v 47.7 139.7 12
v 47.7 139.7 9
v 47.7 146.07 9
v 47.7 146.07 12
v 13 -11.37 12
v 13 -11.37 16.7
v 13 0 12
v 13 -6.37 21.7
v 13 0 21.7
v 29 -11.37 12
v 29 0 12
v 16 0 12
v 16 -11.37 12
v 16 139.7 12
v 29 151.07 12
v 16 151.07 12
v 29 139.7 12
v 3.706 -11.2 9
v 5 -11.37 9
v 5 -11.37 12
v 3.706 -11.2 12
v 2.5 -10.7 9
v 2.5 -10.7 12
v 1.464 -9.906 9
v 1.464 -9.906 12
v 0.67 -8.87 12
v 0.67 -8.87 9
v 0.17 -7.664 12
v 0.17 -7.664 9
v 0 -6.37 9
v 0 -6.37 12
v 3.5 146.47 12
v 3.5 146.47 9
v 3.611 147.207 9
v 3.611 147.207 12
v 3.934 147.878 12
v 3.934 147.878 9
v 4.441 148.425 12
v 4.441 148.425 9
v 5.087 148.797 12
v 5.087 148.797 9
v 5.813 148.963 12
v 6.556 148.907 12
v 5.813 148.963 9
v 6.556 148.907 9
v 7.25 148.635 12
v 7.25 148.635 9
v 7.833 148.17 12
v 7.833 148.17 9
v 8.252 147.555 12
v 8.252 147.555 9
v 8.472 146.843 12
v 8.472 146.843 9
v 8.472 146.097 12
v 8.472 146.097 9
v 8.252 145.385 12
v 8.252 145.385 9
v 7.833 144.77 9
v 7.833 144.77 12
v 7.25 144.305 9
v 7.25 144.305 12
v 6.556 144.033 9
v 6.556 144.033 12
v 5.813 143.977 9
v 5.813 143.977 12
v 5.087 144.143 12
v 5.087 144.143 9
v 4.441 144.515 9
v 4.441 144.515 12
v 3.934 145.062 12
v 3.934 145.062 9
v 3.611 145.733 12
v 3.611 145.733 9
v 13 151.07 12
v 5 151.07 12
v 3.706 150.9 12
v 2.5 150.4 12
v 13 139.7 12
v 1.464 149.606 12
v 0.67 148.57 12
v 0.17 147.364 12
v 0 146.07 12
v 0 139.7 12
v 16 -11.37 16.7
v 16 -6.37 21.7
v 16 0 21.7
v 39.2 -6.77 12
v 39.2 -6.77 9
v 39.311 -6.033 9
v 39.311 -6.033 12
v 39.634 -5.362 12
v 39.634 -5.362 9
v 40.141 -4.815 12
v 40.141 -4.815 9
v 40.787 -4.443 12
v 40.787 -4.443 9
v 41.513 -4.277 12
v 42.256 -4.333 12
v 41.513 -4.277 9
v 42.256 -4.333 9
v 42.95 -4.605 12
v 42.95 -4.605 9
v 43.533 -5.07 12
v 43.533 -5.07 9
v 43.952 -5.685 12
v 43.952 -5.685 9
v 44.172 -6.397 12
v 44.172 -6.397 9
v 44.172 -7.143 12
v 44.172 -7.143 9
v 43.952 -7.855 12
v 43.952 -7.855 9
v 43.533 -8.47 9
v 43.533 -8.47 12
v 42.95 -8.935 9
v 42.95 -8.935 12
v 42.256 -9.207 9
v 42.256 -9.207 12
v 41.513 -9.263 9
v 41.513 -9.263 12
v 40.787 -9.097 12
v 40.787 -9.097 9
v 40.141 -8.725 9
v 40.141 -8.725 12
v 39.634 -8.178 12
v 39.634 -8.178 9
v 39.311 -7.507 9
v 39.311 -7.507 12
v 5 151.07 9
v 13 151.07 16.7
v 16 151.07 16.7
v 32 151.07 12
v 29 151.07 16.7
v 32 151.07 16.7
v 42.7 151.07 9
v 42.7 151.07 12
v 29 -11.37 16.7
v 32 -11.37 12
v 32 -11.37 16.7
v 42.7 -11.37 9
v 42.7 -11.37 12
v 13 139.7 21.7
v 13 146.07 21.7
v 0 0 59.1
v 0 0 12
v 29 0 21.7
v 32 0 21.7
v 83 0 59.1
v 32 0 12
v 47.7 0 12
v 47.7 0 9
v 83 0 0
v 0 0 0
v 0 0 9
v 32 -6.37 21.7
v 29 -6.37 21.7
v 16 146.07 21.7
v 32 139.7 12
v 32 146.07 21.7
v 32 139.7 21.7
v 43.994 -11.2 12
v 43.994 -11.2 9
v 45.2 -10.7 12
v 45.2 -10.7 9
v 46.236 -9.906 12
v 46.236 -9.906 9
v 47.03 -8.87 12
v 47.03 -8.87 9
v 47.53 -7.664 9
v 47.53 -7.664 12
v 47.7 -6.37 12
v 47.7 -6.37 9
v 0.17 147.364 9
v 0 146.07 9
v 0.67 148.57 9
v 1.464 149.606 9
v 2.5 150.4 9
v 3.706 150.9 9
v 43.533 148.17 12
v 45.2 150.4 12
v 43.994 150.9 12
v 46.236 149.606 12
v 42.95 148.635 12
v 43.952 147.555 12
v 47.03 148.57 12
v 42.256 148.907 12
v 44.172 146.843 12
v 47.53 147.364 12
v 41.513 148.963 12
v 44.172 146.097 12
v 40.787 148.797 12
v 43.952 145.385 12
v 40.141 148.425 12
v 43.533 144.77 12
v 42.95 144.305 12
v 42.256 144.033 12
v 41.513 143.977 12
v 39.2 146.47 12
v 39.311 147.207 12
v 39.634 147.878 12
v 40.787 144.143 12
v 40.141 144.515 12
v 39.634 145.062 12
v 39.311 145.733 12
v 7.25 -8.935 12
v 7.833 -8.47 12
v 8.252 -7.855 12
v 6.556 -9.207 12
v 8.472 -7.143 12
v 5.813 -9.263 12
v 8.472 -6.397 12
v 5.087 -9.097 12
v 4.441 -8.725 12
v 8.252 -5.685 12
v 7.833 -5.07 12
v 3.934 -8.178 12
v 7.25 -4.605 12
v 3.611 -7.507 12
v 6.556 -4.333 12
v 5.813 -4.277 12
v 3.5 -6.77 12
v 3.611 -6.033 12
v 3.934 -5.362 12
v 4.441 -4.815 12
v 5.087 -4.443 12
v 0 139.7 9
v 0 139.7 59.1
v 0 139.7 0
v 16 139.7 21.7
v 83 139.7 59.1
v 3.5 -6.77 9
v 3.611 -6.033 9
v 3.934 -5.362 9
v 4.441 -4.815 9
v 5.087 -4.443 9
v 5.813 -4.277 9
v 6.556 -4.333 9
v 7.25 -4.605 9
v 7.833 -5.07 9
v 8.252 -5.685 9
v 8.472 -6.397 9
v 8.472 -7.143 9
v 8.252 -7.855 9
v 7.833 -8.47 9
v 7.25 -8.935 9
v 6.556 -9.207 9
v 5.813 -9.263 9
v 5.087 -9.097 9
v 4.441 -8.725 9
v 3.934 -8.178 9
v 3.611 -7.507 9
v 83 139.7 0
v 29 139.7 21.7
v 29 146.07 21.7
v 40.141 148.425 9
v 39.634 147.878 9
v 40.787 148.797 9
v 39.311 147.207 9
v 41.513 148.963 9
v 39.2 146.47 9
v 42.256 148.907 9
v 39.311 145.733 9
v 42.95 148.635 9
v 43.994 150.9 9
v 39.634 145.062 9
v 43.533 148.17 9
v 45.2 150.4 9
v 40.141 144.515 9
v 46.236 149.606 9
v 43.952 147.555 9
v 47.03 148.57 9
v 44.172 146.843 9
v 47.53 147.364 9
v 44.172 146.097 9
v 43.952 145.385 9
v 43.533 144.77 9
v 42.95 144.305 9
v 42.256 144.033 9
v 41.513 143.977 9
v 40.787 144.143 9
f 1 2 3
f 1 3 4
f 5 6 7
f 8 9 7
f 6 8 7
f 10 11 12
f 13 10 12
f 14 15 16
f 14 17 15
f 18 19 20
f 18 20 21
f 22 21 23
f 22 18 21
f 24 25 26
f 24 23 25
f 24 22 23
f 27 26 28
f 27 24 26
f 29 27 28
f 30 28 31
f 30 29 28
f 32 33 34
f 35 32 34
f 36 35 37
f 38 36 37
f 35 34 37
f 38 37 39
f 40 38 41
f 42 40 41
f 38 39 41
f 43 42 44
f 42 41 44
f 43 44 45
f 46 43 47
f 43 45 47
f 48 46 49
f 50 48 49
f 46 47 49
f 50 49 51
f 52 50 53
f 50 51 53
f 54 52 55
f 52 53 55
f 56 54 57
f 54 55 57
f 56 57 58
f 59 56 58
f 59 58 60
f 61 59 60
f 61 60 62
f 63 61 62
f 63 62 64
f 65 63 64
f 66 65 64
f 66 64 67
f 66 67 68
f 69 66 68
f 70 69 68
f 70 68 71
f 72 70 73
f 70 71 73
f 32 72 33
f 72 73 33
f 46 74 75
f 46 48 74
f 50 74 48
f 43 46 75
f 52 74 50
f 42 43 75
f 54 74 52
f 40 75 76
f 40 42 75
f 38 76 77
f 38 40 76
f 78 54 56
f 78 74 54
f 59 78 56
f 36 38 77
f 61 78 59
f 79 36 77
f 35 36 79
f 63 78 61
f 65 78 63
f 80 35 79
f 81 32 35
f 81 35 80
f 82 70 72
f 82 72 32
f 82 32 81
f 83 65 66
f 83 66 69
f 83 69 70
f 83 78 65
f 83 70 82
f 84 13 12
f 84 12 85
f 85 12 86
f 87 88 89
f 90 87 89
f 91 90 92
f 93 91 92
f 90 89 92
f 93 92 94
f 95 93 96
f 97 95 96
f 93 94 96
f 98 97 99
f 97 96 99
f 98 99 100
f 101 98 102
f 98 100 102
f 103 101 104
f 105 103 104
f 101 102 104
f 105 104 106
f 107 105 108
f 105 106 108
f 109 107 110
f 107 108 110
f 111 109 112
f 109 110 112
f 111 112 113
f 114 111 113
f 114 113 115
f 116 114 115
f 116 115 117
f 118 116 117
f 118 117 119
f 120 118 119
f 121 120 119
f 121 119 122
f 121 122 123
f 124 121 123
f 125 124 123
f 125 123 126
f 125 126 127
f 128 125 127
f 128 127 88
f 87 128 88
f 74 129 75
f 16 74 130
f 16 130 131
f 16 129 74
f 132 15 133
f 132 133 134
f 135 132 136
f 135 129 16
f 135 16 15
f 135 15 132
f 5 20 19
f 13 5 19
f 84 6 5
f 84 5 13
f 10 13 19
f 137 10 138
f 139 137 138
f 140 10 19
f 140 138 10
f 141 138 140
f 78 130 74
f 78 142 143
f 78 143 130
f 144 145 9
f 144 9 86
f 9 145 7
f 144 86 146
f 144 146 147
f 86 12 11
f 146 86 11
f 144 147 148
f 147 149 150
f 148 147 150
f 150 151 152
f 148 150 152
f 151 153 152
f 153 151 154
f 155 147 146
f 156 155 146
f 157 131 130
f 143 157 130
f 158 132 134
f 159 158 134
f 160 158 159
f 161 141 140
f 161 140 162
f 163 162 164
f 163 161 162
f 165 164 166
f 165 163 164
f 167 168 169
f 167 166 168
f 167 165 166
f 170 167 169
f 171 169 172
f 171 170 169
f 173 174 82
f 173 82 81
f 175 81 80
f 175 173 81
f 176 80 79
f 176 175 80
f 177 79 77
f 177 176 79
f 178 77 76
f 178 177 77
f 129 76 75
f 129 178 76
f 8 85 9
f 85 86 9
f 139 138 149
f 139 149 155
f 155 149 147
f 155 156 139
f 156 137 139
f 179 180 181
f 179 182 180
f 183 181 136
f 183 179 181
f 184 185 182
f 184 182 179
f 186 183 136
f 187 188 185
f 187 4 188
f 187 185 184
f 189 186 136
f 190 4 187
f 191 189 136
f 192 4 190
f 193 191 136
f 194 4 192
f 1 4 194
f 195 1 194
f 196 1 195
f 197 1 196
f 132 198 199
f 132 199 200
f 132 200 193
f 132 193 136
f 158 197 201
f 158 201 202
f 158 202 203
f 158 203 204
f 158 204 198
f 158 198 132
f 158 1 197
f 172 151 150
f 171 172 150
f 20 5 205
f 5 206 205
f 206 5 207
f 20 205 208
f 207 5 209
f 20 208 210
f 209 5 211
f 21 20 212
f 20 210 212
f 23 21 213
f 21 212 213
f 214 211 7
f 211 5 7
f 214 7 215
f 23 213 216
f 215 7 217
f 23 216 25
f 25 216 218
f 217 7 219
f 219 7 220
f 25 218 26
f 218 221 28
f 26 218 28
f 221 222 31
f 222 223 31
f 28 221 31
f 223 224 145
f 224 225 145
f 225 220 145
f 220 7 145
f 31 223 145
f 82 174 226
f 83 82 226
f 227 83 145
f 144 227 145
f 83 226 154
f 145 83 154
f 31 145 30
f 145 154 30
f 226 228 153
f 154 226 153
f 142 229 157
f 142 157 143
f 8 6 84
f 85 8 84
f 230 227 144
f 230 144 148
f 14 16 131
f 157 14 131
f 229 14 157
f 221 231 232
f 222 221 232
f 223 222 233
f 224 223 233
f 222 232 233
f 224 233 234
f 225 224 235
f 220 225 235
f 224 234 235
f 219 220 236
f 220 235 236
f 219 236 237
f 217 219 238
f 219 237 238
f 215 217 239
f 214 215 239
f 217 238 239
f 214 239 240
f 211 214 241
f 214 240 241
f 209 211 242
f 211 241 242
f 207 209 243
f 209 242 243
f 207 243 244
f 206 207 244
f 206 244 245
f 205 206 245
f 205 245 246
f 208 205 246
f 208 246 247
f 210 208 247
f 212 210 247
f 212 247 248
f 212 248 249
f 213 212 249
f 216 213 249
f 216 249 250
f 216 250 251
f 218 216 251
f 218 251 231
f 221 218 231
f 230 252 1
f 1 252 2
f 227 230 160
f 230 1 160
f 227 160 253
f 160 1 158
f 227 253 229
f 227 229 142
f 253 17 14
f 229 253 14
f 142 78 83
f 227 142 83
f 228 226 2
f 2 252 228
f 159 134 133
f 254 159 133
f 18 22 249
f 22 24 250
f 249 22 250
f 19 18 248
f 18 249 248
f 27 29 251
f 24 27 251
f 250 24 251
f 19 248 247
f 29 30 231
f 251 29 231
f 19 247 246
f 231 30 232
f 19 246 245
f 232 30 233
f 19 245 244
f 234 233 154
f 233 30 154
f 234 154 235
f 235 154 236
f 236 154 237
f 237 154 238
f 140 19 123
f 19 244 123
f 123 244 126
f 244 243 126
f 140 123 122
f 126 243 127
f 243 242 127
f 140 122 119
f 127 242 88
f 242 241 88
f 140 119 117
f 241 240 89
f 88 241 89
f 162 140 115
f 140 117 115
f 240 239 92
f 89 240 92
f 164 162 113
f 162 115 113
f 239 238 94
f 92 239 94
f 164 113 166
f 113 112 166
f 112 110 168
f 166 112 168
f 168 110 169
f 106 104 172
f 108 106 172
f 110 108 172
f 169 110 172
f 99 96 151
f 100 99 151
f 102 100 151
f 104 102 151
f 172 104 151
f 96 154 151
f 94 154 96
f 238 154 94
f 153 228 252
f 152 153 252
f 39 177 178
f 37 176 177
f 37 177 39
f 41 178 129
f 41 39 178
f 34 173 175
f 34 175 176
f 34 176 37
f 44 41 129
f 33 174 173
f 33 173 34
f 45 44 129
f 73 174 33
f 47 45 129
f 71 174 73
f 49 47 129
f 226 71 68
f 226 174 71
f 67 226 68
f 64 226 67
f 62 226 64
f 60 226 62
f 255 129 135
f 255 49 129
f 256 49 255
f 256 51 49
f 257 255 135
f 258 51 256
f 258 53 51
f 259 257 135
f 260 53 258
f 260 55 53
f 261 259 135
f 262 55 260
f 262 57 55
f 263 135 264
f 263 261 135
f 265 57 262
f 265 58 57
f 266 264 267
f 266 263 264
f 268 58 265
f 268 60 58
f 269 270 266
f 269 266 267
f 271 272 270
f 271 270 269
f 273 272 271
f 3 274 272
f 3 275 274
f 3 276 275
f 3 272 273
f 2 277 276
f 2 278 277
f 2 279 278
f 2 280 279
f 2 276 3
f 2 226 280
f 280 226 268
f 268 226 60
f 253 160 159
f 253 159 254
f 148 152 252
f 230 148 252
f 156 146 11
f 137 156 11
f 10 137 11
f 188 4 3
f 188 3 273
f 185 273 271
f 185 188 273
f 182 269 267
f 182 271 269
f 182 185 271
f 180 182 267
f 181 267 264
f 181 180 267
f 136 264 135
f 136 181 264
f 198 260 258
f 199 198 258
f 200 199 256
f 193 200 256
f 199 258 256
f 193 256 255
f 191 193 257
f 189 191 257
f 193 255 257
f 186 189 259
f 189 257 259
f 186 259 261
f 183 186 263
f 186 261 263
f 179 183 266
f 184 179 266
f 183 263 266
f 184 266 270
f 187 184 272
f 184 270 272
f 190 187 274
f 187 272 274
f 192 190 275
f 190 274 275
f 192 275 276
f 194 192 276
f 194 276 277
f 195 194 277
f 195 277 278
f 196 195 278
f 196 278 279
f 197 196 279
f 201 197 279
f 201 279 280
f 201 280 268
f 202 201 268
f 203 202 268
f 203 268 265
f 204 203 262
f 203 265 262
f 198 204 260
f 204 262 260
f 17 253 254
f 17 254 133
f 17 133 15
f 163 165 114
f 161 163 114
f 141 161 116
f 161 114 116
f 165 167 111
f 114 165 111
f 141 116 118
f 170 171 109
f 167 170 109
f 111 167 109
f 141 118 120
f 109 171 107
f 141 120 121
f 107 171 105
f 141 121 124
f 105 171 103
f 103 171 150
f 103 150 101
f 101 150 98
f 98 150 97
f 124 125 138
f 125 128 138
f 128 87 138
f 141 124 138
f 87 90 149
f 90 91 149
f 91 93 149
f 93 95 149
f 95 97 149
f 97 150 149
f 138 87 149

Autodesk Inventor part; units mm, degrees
ref_plane "YZ Plane" through (0, 0, 0) normal (1, 0, 0) x (0, 1, 0)
ref_plane "XZ Plane" through (0, 0, 0) normal (0, 1, 0) x (-1, 0, 0)
ref_plane "XY Plane" through (0, 0, 0) normal (0, 0, 1) x (1, 0, 0)
sketch "Sketch1" plane through (0, 0, 0) normal (0, 0, 1) x (1, 0, 0)
  line L0 (0, 0) -> (83, 0)
  line L1 (83, 0) -> (83, 139.7)
  line L2 (83, 139.7) -> (0, 139.7)
  line L3 (0, 139.7) -> (0, 0)
  dimension "d0" = 83
  dimension "d1" = 139.7
extrude "Extrusion1" add sketch "Sketch1" along normal blind 59.1
sketch "Sketch2" plane through (0, 139.7, 0) normal (0, 1, 0) x (1, 0, 0)
  line L0 (0, -9) -> (47.7, -9)
  line L1 (47.7, -9) -> (47.7, -12)
  line L2 (47.7, -12) -> (0, -12)
  line L3 (0, -12) -> (0, -9)
  line L4 (83, 0) -> (0, 0) projected
  line L5 (13, -12) -> (16, -12)
  line L6 (16, -12) -> (16, -21.7)
  line L7 (16, -21.7) -> (13, -21.7)
  line L8 (13, -21.7) -> (13, -12)
  line L9 (0, 0) -> (0, -59.1) projected
  line L10 (29, -12) -> (32, -12)
  line L11 (32, -12) -> (32, -21.7)
  line L12 (32, -21.7) -> (29, -21.7)
  line L13 (29, -21.7) -> (29, -12)
  dimension "d4" = 3
  dimension "d5" = 47.7
  dimension "d6" = 9
  dimension "d7" = 9.7
  dimension "d8" = 3
  dimension "d9" = 13
  dimension "d10" = 3
  dimension "d11" = 9.7
  dimension "d12" = 29
extrude "Extrusion2" add sketch "Sketch2" along normal blind 11.37
sketch "Sketch3" plane through (0, 0, 0) normal (0, -1, 0) x (1, 0, 0)
  line L0 (83, 0) -> (0, 0)
  line L1 (0, 9) -> (47.7, 9)
  line L2 (47.7, 9) -> (47.7, 12)
  line L3 (47.7, 12) -> (0, 12)
  line L4 (0, 12) -> (0, 9)
  line L5 (13, 12) -> (16, 12)
  line L6 (16, 12) -> (16, 21.7)
  line L7 (16, 21.7) -> (13, 21.7)
  line L8 (13, 21.7) -> (13, 12)
  line L9 (0, 0) -> (0, 59.1)
  line L10 (29, 12) -> (32, 12)
  line L11 (32, 12) -> (32, 21.7)
  line L12 (32, 21.7) -> (29, 21.7)
  line L13 (29, 21.7) -> (29, 12)
extrude "Extrusion3" add sketch "Sketch3" along normal blind 11.37
fillet "Fillet1" radius 5 4 edges at (0, 151.07, 10.5) (47.7, 151.07, 10.5) (0, -11.37, 10.5) (47.7, -11.37, 10.5)
chamfer "Chamfer1" distance 5 angle 45 4 edges at (30.5, -11.37, 21.7) (14.5, -11.37, 21.7) (30.5, 151.07, 21.7) (14.5, 151.07, 21.7)
sketch "Sketch5" plane through (47.7, 0, 9) normal (0, 0, -1) x (-1, 0, 0)
  circle A0 centre (6, 146.47) radius 2.5
  circle A1 centre (41.7, 146.47) radius 2.5
  circle A2 centre (6, -6.77) radius 2.5
  circle A3 centre (41.7, -6.77) radius 2.5
  line L0 (47.7, 0) -> (47.7, -6.37) projected
  line L1 (0, 0) -> (0, -6.37) projected
  line L2 (0, 139.7) -> (0, 146.07) projected
  line L3 (47.7, 139.7) -> (47.7, 146.07) projected
  line L4 (5, 151.07) -> (42.7, 151.07) projected
  line L5 (42.7, -11.37) -> (5, -11.37) projected
  dimension "d30" = 5
  dimension "d31" = 5
  dimension "d32" = 5
  dimension "d33" = 5
  dimension "d34" = 6
  dimension "d35" = 6
  dimension "d36" = 6
  dimension "d37" = 6
  dimension "d38" = 4.6
  dimension "d39" = 4.6
  dimension "d40" = 4.6
  dimension "d41" = 4.6
extrude "Extrusion4" cut sketch "Sketch5" against normal up to next
properties part number "Battery" material "Aluminum 6061-AHC"
